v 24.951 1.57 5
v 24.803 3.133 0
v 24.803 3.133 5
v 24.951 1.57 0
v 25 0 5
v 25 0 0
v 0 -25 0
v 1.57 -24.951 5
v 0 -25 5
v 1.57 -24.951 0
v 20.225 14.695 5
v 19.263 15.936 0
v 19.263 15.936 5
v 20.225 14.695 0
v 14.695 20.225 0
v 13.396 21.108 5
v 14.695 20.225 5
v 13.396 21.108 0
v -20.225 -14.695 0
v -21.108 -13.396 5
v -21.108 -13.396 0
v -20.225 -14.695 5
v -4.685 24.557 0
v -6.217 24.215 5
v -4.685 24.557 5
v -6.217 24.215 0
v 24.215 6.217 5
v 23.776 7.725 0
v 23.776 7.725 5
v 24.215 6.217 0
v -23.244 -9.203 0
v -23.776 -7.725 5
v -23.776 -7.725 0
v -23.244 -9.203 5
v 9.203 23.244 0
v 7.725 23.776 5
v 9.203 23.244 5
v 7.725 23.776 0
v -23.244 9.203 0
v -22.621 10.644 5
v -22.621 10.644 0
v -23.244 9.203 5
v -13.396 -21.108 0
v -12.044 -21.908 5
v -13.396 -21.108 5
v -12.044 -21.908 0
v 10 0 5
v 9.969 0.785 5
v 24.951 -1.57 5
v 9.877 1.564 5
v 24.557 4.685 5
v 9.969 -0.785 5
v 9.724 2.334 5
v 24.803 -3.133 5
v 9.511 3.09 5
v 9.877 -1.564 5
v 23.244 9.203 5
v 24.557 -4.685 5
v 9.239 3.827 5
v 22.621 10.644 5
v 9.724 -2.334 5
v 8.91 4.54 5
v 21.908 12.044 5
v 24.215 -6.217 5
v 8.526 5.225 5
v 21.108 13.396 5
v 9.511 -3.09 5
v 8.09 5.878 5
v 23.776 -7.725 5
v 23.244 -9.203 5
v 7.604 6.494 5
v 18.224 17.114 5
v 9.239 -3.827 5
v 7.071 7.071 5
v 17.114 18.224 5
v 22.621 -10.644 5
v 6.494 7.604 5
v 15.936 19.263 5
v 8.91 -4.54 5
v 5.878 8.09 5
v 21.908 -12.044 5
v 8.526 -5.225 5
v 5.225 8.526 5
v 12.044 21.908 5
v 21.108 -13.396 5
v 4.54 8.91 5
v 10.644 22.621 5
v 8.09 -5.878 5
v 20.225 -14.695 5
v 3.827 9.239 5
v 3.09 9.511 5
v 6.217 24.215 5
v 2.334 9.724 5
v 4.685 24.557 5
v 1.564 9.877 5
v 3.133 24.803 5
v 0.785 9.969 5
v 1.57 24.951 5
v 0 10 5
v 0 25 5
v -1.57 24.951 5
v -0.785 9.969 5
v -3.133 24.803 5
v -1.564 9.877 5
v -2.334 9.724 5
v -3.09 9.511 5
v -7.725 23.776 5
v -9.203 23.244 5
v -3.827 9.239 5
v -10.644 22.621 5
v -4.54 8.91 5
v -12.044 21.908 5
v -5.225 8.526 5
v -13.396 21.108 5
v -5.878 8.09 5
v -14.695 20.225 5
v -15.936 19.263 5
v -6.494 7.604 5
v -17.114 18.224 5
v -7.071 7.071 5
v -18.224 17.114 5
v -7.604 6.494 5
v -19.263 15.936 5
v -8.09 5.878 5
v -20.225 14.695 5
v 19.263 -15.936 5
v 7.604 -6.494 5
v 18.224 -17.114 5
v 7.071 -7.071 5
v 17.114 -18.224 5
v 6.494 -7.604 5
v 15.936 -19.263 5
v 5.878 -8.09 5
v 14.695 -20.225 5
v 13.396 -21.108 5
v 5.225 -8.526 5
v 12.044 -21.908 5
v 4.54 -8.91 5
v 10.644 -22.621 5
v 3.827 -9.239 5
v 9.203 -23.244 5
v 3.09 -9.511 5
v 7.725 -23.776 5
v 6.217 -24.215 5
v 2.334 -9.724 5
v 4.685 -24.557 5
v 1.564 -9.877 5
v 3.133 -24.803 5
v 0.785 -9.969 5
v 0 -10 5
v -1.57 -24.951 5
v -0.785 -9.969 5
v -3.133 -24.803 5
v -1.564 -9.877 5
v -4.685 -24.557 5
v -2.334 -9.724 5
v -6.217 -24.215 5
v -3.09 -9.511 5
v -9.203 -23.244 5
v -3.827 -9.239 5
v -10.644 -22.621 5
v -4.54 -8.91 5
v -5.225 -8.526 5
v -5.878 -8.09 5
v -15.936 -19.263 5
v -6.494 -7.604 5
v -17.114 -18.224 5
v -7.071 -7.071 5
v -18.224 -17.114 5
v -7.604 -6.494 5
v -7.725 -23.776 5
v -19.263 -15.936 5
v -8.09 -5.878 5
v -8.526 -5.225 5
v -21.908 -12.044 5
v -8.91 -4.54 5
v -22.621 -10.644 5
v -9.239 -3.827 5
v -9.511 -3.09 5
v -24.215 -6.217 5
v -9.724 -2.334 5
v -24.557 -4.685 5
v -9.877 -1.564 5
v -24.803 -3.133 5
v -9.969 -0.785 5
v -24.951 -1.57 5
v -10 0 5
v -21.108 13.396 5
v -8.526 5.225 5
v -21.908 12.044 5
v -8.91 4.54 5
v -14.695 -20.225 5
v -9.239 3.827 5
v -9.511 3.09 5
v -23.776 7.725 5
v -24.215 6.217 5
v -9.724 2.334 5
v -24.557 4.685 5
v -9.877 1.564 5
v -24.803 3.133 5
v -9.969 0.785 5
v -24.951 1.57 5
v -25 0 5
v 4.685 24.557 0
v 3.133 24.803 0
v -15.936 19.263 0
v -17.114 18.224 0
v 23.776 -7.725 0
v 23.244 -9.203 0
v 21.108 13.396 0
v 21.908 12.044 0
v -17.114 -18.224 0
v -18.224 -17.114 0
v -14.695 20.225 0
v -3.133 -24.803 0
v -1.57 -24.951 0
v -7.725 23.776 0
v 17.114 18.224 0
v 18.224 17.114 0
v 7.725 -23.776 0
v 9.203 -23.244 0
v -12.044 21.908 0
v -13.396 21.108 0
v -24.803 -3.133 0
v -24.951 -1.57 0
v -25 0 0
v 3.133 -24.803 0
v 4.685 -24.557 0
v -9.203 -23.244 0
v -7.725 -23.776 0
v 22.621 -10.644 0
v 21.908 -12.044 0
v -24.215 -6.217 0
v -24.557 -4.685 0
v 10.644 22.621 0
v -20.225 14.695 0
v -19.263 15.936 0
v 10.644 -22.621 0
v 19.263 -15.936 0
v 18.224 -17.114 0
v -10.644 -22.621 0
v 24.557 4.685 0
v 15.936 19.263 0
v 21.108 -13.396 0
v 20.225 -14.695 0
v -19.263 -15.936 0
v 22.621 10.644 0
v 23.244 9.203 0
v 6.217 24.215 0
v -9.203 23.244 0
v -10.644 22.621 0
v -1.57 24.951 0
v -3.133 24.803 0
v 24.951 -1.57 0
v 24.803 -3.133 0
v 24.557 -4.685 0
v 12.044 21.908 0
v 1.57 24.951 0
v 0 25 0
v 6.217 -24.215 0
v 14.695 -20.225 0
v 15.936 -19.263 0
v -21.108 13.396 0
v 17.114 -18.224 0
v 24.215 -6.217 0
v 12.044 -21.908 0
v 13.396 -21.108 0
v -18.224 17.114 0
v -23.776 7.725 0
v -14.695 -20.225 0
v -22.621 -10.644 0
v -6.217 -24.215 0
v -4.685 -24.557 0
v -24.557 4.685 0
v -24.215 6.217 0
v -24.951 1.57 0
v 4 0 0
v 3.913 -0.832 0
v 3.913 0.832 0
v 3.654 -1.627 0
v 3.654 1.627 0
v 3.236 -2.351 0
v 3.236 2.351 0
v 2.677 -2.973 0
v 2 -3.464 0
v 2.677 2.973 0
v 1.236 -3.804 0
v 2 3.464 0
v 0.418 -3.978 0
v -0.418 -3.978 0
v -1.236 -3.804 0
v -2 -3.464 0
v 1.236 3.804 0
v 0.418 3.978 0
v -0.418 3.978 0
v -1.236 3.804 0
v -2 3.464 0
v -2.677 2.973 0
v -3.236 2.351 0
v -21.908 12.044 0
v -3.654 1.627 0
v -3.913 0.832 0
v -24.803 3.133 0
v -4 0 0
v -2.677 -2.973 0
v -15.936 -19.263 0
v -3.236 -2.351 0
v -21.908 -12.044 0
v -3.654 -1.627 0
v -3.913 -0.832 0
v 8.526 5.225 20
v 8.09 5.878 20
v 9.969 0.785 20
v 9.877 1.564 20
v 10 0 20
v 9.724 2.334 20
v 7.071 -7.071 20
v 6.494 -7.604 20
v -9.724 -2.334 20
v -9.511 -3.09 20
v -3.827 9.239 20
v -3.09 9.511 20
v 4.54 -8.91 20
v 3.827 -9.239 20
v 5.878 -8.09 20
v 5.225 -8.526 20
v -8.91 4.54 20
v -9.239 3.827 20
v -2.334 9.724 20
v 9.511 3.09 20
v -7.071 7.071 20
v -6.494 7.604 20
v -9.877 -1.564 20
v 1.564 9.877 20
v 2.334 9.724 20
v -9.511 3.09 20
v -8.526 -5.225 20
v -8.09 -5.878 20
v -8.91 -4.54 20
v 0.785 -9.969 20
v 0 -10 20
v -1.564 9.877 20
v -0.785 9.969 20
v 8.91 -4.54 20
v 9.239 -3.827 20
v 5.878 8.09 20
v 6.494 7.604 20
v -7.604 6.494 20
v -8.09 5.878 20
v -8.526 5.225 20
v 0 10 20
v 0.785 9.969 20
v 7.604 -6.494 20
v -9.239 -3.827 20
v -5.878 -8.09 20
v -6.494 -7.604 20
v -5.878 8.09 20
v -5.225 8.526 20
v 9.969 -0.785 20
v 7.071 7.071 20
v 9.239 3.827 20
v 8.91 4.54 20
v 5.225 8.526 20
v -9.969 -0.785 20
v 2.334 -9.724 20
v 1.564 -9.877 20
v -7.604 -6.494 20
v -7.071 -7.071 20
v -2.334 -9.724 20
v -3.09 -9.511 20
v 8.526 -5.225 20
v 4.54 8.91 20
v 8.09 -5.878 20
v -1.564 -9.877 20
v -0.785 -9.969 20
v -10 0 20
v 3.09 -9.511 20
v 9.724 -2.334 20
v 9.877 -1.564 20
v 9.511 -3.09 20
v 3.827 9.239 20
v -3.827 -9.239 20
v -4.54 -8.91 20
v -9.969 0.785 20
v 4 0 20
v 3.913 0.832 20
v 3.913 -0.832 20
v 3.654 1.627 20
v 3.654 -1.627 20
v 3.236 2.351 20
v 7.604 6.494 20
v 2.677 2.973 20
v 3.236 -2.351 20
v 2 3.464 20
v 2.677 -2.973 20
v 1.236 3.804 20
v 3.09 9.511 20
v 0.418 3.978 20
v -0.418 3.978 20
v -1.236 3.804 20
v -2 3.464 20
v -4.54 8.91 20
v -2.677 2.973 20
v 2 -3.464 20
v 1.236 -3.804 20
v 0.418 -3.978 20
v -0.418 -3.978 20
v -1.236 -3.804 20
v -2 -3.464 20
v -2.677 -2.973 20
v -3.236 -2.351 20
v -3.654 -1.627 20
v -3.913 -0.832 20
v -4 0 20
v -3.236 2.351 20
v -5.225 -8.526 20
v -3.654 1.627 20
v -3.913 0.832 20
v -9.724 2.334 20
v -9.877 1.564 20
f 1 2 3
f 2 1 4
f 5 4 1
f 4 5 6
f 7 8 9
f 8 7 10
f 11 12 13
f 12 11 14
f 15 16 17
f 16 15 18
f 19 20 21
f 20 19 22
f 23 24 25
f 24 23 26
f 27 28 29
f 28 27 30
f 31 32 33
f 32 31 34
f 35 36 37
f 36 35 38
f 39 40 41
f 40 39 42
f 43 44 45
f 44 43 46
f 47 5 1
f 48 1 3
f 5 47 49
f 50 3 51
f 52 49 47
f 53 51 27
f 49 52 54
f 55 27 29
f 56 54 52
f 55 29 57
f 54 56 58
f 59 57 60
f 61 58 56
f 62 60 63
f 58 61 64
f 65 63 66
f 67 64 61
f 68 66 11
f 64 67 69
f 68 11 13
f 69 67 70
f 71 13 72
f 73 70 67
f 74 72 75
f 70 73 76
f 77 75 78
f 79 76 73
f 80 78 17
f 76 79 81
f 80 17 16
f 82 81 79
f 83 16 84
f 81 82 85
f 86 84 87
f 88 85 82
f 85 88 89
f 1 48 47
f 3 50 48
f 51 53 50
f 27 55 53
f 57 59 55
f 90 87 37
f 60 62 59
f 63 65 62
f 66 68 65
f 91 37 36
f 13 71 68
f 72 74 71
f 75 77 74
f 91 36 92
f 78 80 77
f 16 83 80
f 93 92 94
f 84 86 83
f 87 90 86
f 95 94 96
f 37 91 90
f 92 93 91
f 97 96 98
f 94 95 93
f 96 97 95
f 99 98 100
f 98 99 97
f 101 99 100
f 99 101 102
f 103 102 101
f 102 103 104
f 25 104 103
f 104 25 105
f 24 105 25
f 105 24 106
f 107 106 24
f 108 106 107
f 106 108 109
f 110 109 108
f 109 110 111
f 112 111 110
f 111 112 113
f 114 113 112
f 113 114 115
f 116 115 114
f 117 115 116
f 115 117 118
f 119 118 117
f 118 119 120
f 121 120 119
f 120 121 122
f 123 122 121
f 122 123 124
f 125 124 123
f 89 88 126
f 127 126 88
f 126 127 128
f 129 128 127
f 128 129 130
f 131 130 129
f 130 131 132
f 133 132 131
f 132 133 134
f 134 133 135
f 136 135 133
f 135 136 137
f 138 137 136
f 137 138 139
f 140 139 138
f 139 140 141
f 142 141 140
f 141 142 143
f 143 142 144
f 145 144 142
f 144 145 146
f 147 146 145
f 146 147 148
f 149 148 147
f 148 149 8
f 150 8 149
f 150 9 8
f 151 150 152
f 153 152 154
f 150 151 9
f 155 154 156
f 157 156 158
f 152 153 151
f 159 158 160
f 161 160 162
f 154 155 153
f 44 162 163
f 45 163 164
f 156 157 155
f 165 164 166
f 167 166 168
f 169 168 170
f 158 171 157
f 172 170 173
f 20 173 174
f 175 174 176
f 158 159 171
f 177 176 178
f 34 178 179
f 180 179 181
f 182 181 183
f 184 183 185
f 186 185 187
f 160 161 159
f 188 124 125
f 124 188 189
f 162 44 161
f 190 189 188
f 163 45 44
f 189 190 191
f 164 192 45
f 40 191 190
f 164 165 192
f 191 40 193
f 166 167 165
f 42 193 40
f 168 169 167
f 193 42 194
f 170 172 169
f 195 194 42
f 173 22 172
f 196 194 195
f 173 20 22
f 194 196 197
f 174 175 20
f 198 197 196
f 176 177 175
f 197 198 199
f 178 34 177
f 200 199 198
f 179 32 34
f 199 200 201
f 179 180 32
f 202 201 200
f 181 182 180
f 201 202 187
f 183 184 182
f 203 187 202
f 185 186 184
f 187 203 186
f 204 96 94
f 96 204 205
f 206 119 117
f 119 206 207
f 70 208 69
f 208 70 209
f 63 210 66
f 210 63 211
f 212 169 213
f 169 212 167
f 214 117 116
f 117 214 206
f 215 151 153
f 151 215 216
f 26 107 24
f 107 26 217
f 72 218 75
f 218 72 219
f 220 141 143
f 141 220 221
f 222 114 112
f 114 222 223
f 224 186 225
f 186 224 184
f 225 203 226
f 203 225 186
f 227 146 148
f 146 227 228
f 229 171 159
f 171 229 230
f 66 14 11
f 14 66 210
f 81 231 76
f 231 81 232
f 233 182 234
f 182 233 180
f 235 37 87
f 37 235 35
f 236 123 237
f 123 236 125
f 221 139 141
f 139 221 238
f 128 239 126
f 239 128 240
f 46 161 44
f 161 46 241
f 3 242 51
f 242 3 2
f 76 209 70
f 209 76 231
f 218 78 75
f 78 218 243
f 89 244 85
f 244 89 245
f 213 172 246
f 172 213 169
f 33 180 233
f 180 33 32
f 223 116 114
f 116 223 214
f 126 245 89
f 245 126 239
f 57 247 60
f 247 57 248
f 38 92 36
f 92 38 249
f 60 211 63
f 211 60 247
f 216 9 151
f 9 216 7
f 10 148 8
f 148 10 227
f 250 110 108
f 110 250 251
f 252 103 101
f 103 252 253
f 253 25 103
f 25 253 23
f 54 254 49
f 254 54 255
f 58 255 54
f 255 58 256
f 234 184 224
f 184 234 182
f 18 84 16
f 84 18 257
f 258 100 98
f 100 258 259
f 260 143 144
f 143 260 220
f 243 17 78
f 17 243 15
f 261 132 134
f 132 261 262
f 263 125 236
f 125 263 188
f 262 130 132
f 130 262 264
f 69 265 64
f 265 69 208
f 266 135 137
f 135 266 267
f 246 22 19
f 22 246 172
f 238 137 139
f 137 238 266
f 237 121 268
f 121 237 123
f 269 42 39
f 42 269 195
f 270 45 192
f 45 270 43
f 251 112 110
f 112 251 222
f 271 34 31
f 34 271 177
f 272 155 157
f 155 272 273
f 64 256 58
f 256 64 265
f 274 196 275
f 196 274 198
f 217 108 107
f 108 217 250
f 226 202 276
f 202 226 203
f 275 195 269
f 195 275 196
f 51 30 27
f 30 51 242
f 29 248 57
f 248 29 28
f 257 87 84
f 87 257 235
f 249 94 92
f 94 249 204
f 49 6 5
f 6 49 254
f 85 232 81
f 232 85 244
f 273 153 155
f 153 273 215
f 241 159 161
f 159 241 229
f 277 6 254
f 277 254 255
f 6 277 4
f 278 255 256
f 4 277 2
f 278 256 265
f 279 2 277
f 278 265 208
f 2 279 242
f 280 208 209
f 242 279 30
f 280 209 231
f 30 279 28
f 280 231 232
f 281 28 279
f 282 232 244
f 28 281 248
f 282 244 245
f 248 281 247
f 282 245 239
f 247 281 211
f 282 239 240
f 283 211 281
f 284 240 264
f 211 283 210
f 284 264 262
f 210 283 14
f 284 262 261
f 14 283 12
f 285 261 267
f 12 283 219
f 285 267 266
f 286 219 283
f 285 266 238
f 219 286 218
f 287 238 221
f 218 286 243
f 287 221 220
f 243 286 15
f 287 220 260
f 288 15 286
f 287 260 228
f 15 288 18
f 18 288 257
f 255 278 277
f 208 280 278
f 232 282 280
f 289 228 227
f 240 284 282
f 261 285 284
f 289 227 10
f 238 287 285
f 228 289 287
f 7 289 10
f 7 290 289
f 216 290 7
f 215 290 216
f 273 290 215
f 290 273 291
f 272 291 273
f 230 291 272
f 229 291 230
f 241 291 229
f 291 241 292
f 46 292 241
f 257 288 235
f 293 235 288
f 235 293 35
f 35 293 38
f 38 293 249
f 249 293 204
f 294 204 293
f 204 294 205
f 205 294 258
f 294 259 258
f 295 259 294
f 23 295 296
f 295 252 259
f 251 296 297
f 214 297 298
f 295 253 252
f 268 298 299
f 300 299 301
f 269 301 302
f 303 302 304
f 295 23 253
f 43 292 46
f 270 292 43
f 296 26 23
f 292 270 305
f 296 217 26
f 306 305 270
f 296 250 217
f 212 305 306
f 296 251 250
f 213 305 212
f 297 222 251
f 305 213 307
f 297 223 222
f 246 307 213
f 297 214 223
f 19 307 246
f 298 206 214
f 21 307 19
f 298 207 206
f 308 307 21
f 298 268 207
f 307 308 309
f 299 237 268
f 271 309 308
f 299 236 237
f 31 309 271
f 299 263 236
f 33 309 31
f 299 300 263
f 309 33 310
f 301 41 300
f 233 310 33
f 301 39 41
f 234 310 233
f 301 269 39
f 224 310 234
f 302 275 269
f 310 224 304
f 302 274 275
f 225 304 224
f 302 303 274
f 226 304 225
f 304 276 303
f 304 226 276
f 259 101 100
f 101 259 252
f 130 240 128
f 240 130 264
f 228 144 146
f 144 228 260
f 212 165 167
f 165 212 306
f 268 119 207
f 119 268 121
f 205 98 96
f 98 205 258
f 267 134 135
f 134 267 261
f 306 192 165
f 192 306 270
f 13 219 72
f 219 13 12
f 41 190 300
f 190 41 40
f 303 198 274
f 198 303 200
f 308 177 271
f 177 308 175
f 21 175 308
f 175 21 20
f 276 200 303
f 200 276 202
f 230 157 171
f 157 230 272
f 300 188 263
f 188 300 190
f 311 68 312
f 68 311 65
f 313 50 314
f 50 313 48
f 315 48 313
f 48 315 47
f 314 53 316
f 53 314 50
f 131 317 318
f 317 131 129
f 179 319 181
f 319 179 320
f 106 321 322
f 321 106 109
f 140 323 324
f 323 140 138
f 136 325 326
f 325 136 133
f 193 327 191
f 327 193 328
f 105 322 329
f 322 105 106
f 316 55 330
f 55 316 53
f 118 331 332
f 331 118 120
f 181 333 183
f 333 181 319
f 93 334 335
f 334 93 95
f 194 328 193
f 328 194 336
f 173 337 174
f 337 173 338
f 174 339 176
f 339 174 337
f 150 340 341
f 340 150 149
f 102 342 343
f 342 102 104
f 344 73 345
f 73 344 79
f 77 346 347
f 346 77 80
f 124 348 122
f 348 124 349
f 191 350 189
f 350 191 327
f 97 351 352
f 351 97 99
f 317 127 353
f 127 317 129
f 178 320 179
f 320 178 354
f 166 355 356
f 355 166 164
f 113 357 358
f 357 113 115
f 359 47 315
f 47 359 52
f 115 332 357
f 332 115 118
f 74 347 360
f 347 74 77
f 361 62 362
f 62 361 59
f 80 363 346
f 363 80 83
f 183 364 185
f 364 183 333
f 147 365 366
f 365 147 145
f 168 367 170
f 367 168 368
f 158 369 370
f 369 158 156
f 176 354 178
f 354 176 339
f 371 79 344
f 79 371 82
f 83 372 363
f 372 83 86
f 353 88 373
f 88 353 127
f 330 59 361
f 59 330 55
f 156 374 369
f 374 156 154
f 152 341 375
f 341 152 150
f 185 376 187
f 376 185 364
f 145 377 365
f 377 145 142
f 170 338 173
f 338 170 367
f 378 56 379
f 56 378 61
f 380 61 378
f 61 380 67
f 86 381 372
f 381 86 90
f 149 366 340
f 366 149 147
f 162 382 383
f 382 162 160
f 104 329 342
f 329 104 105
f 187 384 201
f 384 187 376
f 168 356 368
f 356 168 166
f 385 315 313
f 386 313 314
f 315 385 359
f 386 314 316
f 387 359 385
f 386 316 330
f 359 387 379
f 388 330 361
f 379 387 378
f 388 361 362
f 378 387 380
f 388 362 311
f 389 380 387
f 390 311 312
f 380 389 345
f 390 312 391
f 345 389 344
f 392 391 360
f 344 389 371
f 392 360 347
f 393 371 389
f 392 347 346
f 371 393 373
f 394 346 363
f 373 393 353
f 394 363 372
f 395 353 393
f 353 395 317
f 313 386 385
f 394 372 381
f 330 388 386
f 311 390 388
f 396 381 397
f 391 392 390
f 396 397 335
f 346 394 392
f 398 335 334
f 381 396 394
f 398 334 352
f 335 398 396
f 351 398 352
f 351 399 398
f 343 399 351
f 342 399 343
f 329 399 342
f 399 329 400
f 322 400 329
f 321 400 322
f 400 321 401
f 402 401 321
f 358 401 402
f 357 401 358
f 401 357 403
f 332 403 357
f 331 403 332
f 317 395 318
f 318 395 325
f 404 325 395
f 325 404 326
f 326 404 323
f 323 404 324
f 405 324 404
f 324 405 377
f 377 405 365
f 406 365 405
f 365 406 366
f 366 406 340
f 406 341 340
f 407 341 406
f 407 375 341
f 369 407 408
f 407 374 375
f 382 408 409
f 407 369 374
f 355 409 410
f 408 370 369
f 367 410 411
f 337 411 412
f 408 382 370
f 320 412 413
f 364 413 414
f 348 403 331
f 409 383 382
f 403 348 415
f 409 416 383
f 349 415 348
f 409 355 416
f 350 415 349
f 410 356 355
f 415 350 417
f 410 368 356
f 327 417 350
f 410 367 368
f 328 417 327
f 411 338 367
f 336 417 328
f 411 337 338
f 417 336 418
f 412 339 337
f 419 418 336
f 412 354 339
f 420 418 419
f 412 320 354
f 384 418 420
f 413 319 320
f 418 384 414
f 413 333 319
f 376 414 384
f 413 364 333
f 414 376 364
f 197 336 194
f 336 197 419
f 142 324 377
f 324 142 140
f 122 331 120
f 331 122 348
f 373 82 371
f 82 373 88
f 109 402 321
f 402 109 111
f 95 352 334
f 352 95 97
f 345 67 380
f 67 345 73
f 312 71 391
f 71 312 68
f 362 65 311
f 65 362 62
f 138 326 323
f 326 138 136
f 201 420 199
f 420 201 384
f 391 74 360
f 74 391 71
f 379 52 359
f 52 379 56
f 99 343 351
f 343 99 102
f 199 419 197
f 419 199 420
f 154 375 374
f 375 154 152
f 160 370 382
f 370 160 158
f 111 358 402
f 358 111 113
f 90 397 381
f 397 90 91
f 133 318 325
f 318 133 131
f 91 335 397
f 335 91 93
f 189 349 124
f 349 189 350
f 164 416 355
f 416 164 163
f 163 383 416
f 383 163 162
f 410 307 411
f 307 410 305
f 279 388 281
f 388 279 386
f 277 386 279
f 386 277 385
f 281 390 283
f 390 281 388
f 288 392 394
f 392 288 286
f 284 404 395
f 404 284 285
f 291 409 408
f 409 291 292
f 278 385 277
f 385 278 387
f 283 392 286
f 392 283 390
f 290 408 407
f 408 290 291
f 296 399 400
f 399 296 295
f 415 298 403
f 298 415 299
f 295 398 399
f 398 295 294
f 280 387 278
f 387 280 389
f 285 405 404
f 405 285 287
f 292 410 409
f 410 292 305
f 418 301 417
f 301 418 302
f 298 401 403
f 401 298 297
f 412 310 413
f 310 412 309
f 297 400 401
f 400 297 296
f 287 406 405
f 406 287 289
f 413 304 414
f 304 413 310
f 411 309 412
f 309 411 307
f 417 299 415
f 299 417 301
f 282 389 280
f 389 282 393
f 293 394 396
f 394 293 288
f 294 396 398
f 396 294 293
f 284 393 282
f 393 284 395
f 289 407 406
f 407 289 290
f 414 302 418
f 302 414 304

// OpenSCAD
// rueda con portaejes y taladro para el eje
difference(){
    
union(){
    //base de la rueda
    cylinder(r=50/2,h=5,$fn=100);
    //portaejes
    cylinder(r=20/2,h=20,$fn=80);
}
    //taladro
    cylinder(r=8/2,h=80,$fn=30,center=true);
}
